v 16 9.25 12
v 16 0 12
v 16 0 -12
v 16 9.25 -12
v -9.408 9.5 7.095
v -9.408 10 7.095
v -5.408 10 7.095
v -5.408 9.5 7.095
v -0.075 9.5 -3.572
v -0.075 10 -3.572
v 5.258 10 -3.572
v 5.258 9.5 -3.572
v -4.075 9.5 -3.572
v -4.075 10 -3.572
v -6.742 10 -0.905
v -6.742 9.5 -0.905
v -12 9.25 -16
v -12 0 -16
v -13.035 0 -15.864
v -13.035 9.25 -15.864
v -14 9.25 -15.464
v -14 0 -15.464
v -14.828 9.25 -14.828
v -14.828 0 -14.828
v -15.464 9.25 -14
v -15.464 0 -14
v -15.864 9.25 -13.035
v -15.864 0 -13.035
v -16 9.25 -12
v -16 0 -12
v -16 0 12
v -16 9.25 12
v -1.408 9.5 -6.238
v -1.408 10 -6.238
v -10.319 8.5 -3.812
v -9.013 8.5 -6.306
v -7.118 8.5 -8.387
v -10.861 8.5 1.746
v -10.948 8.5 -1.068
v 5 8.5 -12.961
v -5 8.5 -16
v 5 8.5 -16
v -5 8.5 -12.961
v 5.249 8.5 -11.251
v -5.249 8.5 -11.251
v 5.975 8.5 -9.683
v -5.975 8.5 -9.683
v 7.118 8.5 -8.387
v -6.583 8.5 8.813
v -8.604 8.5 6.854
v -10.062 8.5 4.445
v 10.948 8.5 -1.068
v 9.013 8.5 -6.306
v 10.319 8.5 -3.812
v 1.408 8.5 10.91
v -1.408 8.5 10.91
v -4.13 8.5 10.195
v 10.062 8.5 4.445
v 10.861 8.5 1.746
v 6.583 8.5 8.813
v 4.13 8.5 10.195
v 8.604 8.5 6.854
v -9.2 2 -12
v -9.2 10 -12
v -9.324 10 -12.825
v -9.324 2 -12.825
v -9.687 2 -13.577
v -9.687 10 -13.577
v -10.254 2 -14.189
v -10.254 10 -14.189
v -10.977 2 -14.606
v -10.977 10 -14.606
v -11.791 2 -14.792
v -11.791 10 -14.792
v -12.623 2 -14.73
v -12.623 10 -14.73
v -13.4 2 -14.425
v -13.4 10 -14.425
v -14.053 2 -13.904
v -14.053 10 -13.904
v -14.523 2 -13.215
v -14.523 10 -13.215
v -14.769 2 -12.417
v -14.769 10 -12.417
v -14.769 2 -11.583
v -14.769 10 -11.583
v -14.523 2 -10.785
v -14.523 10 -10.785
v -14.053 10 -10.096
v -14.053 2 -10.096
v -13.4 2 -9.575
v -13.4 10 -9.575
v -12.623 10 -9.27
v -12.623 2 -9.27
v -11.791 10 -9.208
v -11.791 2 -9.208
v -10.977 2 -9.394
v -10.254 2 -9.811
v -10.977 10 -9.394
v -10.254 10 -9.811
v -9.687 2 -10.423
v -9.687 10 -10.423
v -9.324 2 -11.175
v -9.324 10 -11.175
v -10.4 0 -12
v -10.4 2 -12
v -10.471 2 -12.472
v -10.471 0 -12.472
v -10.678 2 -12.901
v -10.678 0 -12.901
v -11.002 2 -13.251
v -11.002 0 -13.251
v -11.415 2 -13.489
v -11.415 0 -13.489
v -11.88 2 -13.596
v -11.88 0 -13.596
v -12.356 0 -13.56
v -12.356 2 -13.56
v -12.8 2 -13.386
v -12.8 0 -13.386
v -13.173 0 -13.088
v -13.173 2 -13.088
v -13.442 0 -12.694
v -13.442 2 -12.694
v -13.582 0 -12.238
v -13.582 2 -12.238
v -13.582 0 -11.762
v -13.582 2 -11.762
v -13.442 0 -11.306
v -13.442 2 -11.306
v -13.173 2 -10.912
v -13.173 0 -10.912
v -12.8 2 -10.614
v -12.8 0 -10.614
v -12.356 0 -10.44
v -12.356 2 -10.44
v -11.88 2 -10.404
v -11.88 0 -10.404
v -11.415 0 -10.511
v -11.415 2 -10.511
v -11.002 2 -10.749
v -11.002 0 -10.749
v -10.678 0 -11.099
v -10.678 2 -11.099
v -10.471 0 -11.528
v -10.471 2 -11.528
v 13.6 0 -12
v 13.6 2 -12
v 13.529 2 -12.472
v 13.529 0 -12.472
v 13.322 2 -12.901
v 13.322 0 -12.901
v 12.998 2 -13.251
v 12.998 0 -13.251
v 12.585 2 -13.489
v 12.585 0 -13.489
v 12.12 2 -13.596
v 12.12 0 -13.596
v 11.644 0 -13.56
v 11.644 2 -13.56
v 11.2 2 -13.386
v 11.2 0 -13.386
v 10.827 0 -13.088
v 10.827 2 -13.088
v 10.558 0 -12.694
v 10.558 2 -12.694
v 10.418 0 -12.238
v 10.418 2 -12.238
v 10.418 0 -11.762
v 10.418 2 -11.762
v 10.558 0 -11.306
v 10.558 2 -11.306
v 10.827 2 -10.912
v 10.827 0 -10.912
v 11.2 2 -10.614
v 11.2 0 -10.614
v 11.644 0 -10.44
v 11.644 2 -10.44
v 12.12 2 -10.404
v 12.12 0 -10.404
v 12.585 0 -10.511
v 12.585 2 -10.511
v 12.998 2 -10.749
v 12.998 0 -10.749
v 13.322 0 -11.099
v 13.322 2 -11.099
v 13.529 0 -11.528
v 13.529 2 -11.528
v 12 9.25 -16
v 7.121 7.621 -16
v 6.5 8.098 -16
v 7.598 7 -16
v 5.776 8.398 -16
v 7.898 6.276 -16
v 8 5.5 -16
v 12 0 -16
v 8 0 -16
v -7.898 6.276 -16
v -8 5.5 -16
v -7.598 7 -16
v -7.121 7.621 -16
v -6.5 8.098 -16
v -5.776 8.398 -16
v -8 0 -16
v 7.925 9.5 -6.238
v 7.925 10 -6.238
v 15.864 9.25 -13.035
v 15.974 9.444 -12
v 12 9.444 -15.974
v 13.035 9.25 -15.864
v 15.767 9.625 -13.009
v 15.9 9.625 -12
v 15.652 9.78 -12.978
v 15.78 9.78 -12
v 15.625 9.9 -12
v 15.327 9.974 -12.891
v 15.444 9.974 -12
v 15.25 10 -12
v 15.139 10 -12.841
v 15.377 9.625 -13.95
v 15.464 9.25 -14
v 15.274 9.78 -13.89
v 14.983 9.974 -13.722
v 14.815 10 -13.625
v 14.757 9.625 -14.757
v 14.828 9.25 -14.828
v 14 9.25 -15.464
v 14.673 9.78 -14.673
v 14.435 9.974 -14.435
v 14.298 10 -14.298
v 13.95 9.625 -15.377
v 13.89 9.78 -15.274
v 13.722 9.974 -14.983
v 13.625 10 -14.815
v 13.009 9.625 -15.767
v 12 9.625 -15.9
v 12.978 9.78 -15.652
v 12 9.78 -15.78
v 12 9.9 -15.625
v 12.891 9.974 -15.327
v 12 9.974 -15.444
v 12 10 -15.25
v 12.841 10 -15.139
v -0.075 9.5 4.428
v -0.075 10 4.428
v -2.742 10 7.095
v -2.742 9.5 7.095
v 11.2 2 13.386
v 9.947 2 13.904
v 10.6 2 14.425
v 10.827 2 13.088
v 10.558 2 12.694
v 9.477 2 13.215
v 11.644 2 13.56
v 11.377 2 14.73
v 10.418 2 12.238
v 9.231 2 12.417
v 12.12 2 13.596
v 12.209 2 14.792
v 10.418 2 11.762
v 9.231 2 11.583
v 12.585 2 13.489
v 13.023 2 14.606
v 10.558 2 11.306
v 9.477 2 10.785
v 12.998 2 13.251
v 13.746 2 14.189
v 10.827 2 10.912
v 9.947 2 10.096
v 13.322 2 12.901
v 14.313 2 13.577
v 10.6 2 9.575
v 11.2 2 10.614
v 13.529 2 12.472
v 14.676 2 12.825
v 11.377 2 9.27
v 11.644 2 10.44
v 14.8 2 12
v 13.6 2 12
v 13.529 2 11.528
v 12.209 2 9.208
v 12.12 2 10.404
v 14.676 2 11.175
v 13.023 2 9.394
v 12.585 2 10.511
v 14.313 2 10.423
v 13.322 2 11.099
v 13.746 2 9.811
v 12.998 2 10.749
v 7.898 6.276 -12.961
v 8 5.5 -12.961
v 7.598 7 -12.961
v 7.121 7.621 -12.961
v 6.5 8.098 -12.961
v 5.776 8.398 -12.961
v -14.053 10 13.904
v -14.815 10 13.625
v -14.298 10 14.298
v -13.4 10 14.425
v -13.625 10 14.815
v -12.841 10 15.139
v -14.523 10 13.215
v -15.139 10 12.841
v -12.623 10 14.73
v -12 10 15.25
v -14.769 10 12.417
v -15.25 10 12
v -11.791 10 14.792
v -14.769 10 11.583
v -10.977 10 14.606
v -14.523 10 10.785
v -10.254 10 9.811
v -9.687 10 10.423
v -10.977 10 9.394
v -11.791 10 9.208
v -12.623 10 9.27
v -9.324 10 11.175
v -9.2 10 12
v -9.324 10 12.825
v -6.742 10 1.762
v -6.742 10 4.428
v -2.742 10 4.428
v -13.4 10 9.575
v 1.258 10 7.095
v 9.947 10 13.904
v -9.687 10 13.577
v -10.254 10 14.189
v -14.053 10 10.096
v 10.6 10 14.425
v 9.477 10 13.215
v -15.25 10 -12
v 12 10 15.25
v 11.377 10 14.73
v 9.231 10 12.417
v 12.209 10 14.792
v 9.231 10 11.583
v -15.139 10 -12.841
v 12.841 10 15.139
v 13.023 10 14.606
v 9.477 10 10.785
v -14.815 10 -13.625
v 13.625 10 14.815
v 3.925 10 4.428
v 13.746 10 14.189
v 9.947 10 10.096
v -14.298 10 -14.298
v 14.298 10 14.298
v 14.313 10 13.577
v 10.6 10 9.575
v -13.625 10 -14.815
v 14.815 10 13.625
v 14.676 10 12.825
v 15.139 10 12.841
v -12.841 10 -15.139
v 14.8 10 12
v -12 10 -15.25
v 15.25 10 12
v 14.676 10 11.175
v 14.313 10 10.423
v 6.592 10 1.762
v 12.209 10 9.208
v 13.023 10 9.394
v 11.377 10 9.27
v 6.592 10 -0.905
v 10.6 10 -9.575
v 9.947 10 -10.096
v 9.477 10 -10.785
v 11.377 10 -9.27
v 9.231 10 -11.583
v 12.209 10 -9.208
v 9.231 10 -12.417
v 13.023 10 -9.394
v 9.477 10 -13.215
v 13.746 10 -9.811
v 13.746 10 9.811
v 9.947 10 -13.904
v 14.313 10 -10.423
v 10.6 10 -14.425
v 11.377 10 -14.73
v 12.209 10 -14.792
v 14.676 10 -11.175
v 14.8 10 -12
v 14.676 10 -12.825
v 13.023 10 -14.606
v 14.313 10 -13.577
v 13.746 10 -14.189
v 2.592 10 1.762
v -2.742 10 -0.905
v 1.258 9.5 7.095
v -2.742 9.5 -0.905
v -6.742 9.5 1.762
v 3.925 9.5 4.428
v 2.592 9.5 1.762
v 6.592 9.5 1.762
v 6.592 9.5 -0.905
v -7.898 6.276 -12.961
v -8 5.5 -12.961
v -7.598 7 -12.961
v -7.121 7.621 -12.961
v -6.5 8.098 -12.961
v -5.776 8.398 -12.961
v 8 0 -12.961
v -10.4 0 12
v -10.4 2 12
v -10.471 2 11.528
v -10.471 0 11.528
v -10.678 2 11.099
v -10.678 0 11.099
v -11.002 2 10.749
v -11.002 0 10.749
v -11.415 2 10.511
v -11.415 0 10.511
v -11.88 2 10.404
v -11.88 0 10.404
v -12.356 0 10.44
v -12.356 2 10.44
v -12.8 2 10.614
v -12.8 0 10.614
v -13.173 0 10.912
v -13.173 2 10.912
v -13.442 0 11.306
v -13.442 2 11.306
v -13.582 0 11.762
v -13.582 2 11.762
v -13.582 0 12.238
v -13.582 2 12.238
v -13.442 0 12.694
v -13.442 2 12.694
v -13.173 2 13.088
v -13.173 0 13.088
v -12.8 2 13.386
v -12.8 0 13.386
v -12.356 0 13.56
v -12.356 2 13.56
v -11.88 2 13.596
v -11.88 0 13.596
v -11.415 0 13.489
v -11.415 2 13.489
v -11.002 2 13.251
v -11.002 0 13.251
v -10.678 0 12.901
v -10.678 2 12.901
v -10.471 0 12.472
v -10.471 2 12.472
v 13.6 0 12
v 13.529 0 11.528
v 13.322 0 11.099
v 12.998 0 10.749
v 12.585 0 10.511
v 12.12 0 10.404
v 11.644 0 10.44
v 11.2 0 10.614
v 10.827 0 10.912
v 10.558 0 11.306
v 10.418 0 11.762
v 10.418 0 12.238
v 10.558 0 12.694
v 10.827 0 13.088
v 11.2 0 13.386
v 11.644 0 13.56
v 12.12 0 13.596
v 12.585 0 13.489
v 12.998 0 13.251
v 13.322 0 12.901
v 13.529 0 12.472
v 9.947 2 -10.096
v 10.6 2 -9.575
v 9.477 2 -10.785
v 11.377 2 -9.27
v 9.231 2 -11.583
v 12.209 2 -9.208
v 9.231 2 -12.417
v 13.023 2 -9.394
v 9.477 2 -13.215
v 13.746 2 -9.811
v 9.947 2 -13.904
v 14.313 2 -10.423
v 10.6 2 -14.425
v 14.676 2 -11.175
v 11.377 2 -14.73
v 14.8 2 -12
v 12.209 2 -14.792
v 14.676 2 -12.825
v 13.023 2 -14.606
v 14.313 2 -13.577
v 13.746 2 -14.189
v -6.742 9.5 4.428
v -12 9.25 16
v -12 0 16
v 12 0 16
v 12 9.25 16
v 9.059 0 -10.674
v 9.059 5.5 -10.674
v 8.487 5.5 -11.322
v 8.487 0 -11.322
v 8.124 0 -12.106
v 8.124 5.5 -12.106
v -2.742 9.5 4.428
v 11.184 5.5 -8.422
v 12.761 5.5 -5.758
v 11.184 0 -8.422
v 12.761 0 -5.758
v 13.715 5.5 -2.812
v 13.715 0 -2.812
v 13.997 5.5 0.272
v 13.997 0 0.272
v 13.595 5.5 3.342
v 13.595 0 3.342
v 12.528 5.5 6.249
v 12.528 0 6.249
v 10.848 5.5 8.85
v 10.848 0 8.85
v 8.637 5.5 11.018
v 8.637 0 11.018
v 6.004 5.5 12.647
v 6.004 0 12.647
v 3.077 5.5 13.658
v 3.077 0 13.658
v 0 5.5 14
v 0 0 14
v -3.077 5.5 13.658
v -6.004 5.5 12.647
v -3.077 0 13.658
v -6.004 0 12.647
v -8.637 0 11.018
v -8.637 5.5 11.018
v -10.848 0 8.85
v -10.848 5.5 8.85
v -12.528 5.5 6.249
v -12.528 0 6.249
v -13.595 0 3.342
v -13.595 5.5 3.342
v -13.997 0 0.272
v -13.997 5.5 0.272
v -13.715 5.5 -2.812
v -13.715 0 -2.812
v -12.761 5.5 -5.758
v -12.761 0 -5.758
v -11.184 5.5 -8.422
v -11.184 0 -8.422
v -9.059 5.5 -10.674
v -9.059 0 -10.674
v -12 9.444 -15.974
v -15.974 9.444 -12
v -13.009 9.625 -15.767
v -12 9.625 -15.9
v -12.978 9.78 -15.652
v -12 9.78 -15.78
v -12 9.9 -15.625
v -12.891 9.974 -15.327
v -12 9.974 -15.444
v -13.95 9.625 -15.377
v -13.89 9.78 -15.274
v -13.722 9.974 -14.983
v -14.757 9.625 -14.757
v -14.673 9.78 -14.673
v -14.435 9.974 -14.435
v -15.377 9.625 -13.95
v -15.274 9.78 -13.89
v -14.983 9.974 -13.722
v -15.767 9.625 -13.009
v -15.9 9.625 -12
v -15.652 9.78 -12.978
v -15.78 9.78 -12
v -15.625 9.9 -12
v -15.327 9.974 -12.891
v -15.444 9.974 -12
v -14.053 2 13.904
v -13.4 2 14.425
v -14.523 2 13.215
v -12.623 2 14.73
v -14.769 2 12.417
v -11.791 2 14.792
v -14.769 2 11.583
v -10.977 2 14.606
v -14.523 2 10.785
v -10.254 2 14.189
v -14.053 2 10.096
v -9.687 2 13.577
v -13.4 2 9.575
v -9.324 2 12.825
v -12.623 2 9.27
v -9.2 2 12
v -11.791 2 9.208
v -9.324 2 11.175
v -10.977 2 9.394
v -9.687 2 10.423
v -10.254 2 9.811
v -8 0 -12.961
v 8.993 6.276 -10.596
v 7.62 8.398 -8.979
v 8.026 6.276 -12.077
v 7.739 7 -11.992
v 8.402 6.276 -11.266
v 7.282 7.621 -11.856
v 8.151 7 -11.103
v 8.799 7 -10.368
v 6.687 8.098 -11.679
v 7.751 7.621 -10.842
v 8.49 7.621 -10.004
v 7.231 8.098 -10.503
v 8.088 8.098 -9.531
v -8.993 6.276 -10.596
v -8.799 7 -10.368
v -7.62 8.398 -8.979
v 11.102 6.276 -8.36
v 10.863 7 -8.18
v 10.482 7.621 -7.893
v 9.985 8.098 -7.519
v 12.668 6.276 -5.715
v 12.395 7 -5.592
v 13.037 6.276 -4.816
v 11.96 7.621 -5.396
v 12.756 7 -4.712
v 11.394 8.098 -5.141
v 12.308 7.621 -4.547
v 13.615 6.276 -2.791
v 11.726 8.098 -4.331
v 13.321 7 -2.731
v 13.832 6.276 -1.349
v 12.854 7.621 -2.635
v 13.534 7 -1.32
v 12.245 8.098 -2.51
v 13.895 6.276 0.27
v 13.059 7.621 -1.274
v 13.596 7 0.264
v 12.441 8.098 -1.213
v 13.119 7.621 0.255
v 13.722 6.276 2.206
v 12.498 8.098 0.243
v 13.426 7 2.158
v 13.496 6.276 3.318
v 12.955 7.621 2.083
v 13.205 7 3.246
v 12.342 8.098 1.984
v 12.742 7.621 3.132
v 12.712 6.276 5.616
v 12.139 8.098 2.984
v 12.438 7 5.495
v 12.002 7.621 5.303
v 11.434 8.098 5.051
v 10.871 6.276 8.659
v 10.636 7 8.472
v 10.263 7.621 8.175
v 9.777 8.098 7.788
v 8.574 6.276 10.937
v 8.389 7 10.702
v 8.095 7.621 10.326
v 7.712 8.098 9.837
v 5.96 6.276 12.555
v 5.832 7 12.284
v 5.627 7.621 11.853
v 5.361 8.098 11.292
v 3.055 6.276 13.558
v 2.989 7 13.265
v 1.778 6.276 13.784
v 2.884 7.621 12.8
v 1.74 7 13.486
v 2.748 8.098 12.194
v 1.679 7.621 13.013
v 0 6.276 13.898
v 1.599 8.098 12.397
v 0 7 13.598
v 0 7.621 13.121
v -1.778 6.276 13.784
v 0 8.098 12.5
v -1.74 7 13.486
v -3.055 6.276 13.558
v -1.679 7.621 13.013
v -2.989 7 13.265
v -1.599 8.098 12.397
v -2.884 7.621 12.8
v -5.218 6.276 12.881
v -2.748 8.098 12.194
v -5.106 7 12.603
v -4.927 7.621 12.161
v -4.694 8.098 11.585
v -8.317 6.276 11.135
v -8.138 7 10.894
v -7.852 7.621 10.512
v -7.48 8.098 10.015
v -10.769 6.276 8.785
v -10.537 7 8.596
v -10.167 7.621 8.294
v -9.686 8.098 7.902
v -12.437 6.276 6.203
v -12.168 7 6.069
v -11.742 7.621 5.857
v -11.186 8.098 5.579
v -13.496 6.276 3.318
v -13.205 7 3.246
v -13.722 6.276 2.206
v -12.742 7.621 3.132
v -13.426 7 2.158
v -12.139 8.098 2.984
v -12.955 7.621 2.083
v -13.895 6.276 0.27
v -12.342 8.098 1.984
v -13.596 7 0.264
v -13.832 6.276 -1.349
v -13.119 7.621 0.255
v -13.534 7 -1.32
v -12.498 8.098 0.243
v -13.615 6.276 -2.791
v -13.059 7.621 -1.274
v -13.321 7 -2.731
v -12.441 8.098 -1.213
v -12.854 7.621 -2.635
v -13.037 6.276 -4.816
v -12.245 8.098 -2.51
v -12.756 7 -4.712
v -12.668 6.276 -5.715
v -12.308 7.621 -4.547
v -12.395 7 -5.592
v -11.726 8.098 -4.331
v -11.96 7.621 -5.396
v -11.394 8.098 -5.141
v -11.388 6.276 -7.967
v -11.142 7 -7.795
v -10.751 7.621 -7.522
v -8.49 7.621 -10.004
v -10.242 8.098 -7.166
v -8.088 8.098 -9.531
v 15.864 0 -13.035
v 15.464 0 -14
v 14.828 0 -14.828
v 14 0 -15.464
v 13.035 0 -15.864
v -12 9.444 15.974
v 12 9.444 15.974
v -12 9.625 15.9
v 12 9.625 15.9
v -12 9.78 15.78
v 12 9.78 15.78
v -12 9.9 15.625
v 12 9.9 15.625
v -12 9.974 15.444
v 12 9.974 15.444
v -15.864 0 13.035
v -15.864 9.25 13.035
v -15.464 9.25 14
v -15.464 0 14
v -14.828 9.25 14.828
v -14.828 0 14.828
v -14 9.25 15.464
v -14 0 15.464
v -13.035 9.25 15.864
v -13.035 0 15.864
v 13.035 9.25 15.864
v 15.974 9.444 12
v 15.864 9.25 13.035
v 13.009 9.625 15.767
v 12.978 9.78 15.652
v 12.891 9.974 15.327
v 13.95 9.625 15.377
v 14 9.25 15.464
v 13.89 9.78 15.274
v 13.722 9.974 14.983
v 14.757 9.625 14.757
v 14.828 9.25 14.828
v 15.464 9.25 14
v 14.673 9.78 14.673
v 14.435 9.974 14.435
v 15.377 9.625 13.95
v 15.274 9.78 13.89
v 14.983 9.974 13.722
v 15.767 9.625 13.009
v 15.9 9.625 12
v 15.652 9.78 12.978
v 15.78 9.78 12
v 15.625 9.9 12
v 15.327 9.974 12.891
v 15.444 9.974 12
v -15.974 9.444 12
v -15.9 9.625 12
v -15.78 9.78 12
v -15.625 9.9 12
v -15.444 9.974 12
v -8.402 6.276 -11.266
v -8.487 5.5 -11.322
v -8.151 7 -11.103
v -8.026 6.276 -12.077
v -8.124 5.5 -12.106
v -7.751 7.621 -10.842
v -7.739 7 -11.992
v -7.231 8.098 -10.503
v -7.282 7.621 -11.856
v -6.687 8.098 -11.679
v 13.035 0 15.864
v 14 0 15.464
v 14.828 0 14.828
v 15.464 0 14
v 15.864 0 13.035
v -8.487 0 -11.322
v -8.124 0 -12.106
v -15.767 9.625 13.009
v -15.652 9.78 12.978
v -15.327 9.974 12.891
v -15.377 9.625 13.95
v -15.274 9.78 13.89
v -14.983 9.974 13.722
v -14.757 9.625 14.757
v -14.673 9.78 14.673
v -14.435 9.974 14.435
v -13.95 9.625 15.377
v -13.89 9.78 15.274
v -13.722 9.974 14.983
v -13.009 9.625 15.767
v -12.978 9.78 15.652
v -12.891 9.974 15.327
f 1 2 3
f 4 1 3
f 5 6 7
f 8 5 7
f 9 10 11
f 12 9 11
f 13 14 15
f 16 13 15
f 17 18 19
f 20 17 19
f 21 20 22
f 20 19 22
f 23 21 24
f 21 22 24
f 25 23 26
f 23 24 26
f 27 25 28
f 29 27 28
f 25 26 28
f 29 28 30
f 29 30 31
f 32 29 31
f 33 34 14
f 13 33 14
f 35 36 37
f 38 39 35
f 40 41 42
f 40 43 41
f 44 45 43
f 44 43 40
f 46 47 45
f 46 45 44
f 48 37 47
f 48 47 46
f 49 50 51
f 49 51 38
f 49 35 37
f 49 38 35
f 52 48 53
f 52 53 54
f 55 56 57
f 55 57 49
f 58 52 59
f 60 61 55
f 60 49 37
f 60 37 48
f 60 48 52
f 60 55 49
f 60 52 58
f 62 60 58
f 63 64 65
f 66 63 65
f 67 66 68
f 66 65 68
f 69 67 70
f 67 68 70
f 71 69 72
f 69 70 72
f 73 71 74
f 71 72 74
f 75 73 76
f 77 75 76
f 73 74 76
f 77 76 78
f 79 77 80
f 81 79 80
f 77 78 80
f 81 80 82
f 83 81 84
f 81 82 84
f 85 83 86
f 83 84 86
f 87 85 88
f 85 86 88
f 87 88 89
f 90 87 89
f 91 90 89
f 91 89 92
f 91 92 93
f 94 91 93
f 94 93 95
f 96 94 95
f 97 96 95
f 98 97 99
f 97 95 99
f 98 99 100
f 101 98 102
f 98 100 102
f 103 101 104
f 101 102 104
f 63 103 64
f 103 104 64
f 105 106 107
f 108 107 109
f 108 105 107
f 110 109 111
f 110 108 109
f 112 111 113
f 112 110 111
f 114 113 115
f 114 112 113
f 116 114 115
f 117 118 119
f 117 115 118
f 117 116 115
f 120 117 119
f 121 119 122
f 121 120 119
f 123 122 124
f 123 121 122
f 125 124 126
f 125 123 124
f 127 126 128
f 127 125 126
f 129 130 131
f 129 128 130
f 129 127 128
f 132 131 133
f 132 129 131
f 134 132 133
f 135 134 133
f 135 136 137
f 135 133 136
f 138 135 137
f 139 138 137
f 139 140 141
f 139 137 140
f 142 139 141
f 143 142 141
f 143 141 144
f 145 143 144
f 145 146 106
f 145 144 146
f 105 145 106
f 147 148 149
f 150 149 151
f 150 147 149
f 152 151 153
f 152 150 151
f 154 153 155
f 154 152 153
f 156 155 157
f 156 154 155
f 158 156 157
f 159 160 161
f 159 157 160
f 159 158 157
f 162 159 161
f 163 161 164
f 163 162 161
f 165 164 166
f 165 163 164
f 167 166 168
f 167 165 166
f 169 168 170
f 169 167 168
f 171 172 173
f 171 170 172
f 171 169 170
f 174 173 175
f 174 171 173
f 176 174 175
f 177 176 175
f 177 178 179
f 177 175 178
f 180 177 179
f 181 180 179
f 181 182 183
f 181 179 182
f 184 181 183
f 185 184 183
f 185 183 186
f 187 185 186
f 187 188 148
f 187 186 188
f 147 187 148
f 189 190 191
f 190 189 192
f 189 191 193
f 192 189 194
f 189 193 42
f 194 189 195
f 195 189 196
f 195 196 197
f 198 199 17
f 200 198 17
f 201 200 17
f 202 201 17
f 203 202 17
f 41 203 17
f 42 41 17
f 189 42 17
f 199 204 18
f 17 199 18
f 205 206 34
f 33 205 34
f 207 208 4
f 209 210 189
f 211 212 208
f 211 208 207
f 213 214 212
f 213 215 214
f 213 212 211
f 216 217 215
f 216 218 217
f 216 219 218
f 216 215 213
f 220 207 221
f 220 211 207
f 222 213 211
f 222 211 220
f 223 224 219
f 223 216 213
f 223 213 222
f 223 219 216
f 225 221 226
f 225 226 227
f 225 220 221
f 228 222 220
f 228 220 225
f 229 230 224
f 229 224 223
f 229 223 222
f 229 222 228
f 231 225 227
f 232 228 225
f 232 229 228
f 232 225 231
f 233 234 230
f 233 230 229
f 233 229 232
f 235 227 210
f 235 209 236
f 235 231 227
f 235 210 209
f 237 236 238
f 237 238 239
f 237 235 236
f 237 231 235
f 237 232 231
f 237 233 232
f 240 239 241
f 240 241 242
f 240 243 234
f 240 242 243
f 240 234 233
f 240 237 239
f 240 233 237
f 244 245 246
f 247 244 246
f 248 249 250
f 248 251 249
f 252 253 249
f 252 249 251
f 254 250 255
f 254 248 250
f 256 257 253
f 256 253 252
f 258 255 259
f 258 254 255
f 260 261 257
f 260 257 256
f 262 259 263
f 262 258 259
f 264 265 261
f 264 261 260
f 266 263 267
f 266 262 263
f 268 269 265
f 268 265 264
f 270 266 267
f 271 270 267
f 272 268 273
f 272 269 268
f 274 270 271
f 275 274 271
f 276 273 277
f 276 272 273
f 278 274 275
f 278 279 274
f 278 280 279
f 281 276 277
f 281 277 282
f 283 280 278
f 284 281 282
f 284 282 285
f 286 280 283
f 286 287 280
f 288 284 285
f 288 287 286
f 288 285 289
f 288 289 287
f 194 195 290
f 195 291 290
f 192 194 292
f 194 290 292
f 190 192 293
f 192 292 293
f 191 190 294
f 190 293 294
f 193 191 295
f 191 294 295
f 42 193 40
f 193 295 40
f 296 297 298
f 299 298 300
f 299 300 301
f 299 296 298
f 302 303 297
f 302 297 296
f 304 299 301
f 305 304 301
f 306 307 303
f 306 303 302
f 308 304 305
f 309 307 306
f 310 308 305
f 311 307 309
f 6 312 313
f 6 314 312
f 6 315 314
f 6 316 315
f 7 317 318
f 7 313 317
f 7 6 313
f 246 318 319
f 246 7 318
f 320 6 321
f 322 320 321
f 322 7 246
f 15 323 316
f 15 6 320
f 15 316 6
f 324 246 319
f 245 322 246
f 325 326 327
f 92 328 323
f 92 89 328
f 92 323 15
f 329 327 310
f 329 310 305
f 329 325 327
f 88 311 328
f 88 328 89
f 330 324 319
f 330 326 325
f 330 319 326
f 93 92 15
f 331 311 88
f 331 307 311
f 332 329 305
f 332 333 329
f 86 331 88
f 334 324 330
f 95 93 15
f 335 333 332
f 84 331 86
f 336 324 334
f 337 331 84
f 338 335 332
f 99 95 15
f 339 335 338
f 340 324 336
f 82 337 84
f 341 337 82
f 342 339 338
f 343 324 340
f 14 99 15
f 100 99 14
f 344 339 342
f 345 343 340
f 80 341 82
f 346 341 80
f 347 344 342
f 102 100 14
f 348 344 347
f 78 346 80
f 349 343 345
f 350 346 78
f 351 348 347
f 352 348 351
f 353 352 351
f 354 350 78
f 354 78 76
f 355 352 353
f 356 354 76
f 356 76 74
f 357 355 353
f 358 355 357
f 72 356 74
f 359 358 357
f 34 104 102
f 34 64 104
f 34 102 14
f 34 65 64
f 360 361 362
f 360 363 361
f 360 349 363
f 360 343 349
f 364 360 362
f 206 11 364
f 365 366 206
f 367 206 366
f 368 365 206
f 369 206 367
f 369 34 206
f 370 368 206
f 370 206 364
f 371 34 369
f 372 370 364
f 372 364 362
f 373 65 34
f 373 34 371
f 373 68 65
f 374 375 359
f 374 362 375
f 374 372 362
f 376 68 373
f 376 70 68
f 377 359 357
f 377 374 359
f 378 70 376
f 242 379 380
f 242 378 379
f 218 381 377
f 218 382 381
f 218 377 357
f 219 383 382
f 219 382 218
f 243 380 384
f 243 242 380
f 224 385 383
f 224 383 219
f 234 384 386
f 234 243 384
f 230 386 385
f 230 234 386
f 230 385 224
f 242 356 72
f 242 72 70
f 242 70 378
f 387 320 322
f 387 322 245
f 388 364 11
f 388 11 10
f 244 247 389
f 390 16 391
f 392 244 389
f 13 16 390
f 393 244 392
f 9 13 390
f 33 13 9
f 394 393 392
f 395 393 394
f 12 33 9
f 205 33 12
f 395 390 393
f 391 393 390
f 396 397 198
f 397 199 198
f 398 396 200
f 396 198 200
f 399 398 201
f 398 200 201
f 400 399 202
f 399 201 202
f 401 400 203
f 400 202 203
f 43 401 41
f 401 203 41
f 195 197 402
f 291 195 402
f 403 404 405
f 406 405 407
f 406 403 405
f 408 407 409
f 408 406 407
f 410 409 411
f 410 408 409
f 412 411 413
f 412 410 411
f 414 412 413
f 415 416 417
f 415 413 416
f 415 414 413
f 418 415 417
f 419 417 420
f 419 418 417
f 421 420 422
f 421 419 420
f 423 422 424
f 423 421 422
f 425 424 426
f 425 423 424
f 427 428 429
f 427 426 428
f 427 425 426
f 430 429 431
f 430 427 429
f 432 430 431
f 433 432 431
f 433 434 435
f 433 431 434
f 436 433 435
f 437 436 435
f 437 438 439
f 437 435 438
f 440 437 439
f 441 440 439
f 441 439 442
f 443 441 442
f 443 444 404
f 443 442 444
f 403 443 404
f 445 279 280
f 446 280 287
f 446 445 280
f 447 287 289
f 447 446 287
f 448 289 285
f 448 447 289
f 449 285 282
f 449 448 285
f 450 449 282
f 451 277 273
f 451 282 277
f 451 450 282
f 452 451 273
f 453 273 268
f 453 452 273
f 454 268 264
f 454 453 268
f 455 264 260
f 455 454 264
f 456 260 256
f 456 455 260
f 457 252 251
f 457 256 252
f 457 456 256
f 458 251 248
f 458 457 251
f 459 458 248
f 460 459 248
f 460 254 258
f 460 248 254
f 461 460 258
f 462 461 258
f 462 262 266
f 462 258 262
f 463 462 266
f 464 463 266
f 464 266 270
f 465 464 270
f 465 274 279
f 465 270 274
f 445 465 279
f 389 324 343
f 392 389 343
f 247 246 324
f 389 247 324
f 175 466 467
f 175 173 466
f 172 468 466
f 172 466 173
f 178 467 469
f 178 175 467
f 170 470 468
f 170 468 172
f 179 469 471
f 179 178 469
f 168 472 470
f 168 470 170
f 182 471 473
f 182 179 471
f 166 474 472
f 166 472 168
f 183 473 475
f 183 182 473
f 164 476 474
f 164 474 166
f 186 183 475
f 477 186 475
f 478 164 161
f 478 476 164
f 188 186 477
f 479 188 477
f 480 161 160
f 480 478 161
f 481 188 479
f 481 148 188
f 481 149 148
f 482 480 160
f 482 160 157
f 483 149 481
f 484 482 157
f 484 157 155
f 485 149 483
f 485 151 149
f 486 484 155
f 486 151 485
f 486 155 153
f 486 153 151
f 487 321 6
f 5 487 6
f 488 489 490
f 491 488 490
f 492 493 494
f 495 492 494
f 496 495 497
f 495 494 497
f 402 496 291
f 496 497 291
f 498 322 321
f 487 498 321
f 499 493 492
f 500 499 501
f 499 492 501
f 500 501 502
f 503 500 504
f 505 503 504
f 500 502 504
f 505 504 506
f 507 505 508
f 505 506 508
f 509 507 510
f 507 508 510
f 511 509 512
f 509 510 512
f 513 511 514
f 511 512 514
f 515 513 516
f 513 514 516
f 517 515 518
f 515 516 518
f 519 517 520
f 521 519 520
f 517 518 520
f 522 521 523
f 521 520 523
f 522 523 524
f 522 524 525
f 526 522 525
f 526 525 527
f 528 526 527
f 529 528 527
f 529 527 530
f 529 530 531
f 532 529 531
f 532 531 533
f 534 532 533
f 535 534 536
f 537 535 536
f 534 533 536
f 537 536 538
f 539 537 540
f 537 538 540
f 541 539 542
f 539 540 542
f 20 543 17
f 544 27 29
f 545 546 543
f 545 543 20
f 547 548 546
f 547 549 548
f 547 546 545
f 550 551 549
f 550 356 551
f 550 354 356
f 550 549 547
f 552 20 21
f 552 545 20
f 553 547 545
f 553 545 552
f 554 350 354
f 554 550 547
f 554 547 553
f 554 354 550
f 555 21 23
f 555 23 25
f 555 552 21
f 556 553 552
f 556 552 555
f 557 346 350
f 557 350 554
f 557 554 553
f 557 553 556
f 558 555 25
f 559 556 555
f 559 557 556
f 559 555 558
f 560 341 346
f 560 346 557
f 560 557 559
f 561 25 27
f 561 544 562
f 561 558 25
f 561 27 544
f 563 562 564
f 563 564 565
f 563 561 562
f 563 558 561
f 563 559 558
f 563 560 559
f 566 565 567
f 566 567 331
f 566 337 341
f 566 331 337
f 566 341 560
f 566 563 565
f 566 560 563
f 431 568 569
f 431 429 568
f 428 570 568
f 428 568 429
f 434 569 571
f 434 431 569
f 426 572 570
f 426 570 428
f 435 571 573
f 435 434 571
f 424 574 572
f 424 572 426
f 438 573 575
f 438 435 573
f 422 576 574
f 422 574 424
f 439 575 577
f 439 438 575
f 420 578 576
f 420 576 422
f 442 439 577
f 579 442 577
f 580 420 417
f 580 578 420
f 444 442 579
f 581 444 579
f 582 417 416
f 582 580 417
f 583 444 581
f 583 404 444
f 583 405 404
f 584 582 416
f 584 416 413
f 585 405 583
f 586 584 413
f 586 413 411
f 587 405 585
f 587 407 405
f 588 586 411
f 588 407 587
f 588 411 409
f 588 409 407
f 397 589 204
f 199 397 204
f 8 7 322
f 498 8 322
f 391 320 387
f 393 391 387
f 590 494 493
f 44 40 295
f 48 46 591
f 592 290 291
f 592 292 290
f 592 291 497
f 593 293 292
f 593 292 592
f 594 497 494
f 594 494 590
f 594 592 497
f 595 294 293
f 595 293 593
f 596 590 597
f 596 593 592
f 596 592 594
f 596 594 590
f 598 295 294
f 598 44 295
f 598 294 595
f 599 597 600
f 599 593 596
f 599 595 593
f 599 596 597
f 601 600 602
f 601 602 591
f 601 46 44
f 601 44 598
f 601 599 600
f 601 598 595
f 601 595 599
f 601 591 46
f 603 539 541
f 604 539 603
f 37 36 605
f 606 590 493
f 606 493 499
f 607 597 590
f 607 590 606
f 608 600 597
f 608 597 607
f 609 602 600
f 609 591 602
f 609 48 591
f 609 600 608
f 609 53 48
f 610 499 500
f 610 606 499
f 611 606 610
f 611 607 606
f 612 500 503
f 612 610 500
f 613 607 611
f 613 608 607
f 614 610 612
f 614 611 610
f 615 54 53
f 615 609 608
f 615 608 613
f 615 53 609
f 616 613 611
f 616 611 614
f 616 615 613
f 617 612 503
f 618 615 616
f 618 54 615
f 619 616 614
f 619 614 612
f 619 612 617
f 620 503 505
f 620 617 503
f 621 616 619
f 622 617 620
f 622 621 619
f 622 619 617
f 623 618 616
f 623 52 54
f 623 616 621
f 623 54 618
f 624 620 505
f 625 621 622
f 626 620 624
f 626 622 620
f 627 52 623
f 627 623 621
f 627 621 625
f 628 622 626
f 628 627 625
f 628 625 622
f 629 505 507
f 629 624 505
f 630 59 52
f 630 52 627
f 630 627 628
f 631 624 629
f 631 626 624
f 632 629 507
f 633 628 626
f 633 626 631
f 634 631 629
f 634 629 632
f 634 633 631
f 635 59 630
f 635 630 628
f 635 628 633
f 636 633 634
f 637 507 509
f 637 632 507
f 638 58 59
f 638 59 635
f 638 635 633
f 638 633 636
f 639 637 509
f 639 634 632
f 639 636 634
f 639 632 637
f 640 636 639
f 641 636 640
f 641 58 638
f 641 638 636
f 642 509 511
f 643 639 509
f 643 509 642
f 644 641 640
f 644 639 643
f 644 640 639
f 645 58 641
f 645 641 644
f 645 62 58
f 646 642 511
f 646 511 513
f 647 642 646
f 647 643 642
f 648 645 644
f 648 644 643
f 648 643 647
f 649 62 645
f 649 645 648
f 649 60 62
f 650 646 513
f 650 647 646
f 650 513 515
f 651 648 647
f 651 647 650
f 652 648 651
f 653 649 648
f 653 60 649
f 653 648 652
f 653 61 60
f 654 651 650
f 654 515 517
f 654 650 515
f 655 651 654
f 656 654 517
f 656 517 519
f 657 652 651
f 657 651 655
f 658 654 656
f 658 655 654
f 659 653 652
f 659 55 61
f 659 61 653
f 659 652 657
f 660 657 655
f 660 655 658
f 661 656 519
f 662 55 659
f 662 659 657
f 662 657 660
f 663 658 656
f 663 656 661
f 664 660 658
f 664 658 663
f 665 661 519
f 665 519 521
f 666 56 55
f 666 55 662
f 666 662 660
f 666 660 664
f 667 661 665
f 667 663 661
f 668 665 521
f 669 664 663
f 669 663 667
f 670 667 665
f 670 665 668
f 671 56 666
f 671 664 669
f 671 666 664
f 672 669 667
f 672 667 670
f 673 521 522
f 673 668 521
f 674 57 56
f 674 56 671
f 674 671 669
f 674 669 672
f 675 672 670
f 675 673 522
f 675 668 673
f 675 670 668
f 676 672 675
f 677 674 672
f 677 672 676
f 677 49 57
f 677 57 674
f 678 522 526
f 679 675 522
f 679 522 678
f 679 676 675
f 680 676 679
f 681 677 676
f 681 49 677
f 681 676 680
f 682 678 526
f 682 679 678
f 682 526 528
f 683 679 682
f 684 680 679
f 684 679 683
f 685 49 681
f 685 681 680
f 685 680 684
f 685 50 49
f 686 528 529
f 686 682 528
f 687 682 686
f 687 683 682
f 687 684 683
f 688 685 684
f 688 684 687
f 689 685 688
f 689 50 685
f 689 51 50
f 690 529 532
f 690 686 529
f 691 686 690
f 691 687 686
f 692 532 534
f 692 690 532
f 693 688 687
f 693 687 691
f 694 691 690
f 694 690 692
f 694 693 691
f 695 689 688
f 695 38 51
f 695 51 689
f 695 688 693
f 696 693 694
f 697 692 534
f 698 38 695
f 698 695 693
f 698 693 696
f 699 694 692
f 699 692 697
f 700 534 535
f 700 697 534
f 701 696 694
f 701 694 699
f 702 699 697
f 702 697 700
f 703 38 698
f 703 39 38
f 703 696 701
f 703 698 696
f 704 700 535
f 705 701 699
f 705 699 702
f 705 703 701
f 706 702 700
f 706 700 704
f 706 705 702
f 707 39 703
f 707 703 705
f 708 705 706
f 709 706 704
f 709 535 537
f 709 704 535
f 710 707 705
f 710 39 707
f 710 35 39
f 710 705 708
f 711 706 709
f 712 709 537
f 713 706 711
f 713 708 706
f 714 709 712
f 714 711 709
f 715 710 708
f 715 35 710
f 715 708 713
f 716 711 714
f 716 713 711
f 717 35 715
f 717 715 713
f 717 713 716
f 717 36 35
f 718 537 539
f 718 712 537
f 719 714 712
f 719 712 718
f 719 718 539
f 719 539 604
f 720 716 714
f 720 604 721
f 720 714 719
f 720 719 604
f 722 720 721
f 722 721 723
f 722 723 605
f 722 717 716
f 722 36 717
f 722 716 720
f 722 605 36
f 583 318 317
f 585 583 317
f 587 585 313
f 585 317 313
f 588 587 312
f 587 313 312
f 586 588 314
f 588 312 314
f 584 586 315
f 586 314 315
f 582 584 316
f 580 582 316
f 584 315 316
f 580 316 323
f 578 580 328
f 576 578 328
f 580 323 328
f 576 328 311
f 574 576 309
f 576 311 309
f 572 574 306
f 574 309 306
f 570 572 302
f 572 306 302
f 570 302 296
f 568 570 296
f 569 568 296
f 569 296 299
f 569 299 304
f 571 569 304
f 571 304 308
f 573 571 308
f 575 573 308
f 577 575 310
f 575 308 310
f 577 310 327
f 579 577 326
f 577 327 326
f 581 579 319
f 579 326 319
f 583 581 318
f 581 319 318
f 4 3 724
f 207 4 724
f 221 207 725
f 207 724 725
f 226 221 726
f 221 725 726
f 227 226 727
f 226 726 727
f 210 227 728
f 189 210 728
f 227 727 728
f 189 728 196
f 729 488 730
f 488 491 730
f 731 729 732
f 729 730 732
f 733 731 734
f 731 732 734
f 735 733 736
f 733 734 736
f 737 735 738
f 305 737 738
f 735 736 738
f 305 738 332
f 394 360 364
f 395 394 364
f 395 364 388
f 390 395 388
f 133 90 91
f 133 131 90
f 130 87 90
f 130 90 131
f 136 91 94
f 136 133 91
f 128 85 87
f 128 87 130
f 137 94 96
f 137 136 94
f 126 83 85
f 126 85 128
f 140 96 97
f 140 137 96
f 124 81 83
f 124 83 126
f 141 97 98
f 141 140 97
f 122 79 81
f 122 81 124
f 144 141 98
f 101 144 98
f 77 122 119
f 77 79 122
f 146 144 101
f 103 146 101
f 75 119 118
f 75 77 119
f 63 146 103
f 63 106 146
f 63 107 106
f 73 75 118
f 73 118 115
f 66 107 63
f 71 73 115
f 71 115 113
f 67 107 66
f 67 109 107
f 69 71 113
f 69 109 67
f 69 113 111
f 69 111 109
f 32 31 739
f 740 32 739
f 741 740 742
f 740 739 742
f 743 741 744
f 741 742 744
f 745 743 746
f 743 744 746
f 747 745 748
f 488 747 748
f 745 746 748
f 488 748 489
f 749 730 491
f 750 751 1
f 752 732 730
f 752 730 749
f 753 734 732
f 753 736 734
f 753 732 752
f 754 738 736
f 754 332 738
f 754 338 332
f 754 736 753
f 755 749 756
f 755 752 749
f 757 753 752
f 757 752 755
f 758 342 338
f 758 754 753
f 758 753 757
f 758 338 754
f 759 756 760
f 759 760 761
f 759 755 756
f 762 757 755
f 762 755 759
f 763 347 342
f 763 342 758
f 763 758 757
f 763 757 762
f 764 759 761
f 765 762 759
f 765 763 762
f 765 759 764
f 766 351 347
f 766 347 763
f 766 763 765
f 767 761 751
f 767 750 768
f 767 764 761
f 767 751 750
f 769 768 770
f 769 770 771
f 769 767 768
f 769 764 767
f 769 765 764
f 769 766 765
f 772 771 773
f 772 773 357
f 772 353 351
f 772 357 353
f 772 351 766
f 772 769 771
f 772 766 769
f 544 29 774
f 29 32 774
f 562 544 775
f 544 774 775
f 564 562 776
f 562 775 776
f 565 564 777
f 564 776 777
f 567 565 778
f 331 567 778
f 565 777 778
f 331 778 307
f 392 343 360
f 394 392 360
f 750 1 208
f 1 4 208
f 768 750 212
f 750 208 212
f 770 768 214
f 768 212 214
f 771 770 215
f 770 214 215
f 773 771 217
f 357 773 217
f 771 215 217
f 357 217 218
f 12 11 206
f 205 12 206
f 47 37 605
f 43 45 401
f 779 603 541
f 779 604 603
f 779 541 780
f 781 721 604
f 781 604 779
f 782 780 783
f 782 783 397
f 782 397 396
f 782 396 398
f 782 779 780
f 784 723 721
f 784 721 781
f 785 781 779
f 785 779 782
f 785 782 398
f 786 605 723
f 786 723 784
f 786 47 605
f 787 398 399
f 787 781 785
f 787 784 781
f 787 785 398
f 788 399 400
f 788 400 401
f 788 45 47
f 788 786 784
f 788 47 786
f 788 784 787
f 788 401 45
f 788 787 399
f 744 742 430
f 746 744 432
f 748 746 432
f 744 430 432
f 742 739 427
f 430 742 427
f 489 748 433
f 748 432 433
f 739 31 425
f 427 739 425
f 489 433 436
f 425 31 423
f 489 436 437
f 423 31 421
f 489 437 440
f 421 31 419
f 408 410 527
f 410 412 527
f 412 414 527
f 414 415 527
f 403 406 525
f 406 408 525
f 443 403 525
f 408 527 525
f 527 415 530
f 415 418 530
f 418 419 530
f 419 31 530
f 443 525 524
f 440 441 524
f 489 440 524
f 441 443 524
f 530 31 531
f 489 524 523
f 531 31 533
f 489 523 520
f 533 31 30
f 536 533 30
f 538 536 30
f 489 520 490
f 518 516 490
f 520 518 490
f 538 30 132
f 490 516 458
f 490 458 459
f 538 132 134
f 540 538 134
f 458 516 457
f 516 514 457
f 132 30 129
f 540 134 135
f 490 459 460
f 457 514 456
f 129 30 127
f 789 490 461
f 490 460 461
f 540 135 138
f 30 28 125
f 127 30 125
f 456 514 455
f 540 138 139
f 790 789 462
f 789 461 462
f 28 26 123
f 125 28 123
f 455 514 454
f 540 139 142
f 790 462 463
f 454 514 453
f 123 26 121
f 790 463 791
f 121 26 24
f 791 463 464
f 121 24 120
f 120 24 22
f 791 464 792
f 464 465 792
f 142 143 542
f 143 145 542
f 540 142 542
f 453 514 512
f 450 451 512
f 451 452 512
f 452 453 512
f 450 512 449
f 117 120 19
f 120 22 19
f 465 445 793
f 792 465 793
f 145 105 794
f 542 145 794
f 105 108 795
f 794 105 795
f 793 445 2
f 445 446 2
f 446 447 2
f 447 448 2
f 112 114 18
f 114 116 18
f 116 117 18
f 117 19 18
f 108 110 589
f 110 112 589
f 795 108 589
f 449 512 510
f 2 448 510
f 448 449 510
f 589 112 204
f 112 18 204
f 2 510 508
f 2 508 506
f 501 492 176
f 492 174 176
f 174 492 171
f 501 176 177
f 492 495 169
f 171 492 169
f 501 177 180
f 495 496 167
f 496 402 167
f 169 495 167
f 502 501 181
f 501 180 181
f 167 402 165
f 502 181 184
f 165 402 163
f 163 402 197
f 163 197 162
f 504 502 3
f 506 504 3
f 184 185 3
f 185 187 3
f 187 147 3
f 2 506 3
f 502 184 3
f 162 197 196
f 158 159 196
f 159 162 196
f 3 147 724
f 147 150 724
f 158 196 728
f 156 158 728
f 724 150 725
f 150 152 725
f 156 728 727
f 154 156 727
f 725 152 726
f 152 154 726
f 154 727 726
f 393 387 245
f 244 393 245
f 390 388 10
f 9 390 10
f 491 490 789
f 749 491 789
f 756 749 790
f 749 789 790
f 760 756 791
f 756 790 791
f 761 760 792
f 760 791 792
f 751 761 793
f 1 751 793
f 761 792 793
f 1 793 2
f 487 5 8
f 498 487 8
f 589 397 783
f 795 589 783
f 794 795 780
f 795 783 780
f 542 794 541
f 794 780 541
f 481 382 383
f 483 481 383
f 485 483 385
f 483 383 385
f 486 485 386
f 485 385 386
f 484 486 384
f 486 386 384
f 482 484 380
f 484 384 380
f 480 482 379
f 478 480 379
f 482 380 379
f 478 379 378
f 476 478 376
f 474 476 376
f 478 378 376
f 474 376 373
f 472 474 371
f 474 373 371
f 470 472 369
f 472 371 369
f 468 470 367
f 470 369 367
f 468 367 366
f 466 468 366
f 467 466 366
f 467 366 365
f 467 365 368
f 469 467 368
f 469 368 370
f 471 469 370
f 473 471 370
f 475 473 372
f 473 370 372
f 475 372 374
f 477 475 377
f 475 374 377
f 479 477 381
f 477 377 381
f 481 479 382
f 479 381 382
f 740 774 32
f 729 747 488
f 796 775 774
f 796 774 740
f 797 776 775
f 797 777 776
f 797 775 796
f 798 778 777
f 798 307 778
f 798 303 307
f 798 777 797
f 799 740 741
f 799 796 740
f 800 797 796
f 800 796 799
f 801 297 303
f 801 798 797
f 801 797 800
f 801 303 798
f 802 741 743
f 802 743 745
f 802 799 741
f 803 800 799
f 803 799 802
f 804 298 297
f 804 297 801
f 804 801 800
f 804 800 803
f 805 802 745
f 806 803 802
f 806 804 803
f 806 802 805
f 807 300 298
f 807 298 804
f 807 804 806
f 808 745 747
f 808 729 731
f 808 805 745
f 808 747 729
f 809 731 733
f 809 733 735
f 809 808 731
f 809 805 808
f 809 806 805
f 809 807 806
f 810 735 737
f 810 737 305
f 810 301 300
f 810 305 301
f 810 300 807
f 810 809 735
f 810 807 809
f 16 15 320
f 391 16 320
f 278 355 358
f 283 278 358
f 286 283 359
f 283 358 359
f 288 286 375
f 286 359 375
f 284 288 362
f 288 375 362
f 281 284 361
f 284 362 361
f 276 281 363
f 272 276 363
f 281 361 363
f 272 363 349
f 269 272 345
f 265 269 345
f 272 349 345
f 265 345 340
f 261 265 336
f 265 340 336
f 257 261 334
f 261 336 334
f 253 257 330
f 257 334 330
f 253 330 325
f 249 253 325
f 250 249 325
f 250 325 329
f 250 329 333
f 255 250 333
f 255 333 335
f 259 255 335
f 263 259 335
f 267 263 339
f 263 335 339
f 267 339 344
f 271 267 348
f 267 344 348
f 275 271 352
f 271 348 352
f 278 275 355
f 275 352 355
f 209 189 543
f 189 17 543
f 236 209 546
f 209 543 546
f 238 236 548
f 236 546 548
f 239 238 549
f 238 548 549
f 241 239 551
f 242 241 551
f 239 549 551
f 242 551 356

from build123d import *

# Parameters (mm, degrees)
SKETCH1_R           = 1.6
BOSS_EXTRUDE1_DEPTH = 10
CUT_EXTRUDE1_DEPTH  = 8.5
SKETCH3_R           = 2.8
CUT_EXTRUDE2_DEPTH  = 8
FILLET1_R           = 3
FILLET2_R           = 3
FILLET3_R           = 0.75
CUT_EXTRUDE3_DEPTH  = 0.5


with BuildPart() as part:
    # Sketch1 → Boss-Extrude1 (new body)
    with BuildSketch(Plane(origin=(0, 0, 0), x_dir=(1, 0, 0), z_dir=(0, 1, 0))):
        with BuildLine():
            ThreePointArc((12, -16), (14.828427125, -14.828427125), (16, -12))
            Line((16, -12), (16, 12))
            ThreePointArc((16, 12), (14.828427125, 14.828427125), (12, 16))
            Line((12, 16), (-12, 16))
            ThreePointArc((-12, 16), (-14.828427125, 14.828427125), (-16, 12))
            Line((-16, 12), (-16, -12))
            ThreePointArc((-16, -12), (-14.828427125, -14.828427125), (-12, -16))
            Line((-12, -16), (12, -16))
        make_face()
        with Locations((-12, -12)):
            Circle(SKETCH1_R, mode=Mode.SUBTRACT)
        with Locations((12, -12)):
            Circle(SKETCH1_R, mode=Mode.SUBTRACT)
        with Locations((-12, 12)):
            Circle(SKETCH1_R, mode=Mode.SUBTRACT)
        with Locations((12, 12)):
            Circle(SKETCH1_R, mode=Mode.SUBTRACT)
    extrude(amount=BOSS_EXTRUDE1_DEPTH)

    # Sketch2 → Cut-Extrude1 (cut)
    with BuildSketch(Plane.XZ):
        with BuildLine():
            Line((-8, -16), (8, -16))
            Line((8, -16), (8, -11.489125293))
            ThreePointArc((8, -11.489125293), (0, 14), (-8, -11.489125293))
            Line((-8, -11.489125293), (-8, -16))
        make_face()
    extrude(amount=-CUT_EXTRUDE1_DEPTH, mode=Mode.SUBTRACT)

    # Sketch3 → Cut-Extrude2 (cut)
    with BuildSketch(Plane(origin=(0, 10, 0), x_dir=(1, 0, 0), z_dir=(0, 1, 0))):
        with Locations((-12, 12)):
            Circle(SKETCH3_R)
        with Locations((12, 12)):
            Circle(SKETCH3_R)
        with Locations((12, -12)):
            Circle(SKETCH3_R)
        with Locations((-12, -12)):
            Circle(SKETCH3_R)
    extrude(amount=-CUT_EXTRUDE2_DEPTH, mode=Mode.SUBTRACT)

    # Fillet1
    fillet1_edges = [part.edges().sort_by_distance(p)[0] for p in [
        (8, 4.25, -11.489125293),
        (-8, 4.25, -11.489125293),
    ]]
    fillet(fillet1_edges, radius=FILLET1_R)

    # Fillet2
    fillet2_edges = [part.edges().sort_by_distance(p)[0] for p in [
        (8, 8.5, -14.480740698),
        (-8, 8.5, -14.480740698),
        (0, 8.5, 14),
        (-8.277544361, 8.5, -11.701229321),
        (8.277544361, 8.5, -11.701229321),
    ]]
    fillet(fillet2_edges, radius=FILLET2_R)

    # Fillet3
    fillet3_edges = [part.edges().sort_by_distance(p)[0] for p in [
        (0, 10, 16),
        (14.828427125, 10, 14.828427125),
        (16, 10, 0),
        (14.828427125, 10, -14.828427125),
        (0, 10, -16),
        (-14.828427125, 10, -14.828427125),
        (-16, 10, 0),
        (-14.828427125, 10, 14.828427125),
    ]]
    fillet(fillet3_edges, radius=FILLET3_R)

    # Sketch6 → Cut-Extrude3 (cut)
    with BuildSketch(Plane(origin=(0, 10, 0), x_dir=(1, 0, 0), z_dir=(0, 1, 0))):
        Polygon((-6.741615885, -7.094845439), (-4.074949219, -4.428178772), (-6.741615885, -4.428178772), (-9.408282552, -7.094845439), align=None)
        Polygon((-2.741615885, -4.428178772), (-4.074949219, -4.428178772), (-6.741615885, -7.094845439), (-5.408282552, -7.094845439), align=None)
        Polygon((1.258384115, -7.094845439), (3.925050781, -4.428178772), (-0.074949219, -4.428178772), (-2.741615885, -7.094845439), align=None)
        Polygon((3.925050781, -4.428178772), (6.591717448, -1.761512106), (2.591717448, -1.761512106), (-0.074949219, -4.428178772), align=None)
        Polygon((6.591717448, 0.905154561), (5.258384115, 0.905154561), (2.591717448, -1.761512106), (6.591717448, -1.761512106), align=None)
        Polygon((2.591717448, -1.761512106), (5.258384115, 0.905154561), (1.258384115, 0.905154561), (-1.408282552, -1.761512106), align=None)
        Polygon((-1.408282552, -1.761512106), (1.258384115, 0.905154561), (-2.741615885, 0.905154561), (-5.408282552, -1.761512106), align=None)
        Polygon((-5.408282552, -1.761512106), (-2.741615885, 0.905154561), (-6.741615885, 0.905154561), (-6.741615885, -1.761512106), align=None)
        Polygon((-2.741615885, 0.905154561), (-0.074949219, 3.571821228), (-4.074949219, 3.571821228), (-6.741615885, 0.905154561), align=None)
        Polygon((-0.074949219, 3.571821228), (2.591717448, 6.238487894), (-1.408282552, 6.238487894), (-4.074949219, 3.571821228), align=None)
        Polygon((3.925050781, 3.571821228), (6.591717448, 6.238487894), (2.591717448, 6.238487894), (-0.074949219, 3.571821228), align=None)
        Polygon((5.258384115, 3.571821228), (7.925050781, 6.238487894), (6.591717448, 6.238487894), (3.925050781, 3.571821228), align=None)
    extrude(amount=-CUT_EXTRUDE3_DEPTH, mode=Mode.SUBTRACT)


solid = part.part
